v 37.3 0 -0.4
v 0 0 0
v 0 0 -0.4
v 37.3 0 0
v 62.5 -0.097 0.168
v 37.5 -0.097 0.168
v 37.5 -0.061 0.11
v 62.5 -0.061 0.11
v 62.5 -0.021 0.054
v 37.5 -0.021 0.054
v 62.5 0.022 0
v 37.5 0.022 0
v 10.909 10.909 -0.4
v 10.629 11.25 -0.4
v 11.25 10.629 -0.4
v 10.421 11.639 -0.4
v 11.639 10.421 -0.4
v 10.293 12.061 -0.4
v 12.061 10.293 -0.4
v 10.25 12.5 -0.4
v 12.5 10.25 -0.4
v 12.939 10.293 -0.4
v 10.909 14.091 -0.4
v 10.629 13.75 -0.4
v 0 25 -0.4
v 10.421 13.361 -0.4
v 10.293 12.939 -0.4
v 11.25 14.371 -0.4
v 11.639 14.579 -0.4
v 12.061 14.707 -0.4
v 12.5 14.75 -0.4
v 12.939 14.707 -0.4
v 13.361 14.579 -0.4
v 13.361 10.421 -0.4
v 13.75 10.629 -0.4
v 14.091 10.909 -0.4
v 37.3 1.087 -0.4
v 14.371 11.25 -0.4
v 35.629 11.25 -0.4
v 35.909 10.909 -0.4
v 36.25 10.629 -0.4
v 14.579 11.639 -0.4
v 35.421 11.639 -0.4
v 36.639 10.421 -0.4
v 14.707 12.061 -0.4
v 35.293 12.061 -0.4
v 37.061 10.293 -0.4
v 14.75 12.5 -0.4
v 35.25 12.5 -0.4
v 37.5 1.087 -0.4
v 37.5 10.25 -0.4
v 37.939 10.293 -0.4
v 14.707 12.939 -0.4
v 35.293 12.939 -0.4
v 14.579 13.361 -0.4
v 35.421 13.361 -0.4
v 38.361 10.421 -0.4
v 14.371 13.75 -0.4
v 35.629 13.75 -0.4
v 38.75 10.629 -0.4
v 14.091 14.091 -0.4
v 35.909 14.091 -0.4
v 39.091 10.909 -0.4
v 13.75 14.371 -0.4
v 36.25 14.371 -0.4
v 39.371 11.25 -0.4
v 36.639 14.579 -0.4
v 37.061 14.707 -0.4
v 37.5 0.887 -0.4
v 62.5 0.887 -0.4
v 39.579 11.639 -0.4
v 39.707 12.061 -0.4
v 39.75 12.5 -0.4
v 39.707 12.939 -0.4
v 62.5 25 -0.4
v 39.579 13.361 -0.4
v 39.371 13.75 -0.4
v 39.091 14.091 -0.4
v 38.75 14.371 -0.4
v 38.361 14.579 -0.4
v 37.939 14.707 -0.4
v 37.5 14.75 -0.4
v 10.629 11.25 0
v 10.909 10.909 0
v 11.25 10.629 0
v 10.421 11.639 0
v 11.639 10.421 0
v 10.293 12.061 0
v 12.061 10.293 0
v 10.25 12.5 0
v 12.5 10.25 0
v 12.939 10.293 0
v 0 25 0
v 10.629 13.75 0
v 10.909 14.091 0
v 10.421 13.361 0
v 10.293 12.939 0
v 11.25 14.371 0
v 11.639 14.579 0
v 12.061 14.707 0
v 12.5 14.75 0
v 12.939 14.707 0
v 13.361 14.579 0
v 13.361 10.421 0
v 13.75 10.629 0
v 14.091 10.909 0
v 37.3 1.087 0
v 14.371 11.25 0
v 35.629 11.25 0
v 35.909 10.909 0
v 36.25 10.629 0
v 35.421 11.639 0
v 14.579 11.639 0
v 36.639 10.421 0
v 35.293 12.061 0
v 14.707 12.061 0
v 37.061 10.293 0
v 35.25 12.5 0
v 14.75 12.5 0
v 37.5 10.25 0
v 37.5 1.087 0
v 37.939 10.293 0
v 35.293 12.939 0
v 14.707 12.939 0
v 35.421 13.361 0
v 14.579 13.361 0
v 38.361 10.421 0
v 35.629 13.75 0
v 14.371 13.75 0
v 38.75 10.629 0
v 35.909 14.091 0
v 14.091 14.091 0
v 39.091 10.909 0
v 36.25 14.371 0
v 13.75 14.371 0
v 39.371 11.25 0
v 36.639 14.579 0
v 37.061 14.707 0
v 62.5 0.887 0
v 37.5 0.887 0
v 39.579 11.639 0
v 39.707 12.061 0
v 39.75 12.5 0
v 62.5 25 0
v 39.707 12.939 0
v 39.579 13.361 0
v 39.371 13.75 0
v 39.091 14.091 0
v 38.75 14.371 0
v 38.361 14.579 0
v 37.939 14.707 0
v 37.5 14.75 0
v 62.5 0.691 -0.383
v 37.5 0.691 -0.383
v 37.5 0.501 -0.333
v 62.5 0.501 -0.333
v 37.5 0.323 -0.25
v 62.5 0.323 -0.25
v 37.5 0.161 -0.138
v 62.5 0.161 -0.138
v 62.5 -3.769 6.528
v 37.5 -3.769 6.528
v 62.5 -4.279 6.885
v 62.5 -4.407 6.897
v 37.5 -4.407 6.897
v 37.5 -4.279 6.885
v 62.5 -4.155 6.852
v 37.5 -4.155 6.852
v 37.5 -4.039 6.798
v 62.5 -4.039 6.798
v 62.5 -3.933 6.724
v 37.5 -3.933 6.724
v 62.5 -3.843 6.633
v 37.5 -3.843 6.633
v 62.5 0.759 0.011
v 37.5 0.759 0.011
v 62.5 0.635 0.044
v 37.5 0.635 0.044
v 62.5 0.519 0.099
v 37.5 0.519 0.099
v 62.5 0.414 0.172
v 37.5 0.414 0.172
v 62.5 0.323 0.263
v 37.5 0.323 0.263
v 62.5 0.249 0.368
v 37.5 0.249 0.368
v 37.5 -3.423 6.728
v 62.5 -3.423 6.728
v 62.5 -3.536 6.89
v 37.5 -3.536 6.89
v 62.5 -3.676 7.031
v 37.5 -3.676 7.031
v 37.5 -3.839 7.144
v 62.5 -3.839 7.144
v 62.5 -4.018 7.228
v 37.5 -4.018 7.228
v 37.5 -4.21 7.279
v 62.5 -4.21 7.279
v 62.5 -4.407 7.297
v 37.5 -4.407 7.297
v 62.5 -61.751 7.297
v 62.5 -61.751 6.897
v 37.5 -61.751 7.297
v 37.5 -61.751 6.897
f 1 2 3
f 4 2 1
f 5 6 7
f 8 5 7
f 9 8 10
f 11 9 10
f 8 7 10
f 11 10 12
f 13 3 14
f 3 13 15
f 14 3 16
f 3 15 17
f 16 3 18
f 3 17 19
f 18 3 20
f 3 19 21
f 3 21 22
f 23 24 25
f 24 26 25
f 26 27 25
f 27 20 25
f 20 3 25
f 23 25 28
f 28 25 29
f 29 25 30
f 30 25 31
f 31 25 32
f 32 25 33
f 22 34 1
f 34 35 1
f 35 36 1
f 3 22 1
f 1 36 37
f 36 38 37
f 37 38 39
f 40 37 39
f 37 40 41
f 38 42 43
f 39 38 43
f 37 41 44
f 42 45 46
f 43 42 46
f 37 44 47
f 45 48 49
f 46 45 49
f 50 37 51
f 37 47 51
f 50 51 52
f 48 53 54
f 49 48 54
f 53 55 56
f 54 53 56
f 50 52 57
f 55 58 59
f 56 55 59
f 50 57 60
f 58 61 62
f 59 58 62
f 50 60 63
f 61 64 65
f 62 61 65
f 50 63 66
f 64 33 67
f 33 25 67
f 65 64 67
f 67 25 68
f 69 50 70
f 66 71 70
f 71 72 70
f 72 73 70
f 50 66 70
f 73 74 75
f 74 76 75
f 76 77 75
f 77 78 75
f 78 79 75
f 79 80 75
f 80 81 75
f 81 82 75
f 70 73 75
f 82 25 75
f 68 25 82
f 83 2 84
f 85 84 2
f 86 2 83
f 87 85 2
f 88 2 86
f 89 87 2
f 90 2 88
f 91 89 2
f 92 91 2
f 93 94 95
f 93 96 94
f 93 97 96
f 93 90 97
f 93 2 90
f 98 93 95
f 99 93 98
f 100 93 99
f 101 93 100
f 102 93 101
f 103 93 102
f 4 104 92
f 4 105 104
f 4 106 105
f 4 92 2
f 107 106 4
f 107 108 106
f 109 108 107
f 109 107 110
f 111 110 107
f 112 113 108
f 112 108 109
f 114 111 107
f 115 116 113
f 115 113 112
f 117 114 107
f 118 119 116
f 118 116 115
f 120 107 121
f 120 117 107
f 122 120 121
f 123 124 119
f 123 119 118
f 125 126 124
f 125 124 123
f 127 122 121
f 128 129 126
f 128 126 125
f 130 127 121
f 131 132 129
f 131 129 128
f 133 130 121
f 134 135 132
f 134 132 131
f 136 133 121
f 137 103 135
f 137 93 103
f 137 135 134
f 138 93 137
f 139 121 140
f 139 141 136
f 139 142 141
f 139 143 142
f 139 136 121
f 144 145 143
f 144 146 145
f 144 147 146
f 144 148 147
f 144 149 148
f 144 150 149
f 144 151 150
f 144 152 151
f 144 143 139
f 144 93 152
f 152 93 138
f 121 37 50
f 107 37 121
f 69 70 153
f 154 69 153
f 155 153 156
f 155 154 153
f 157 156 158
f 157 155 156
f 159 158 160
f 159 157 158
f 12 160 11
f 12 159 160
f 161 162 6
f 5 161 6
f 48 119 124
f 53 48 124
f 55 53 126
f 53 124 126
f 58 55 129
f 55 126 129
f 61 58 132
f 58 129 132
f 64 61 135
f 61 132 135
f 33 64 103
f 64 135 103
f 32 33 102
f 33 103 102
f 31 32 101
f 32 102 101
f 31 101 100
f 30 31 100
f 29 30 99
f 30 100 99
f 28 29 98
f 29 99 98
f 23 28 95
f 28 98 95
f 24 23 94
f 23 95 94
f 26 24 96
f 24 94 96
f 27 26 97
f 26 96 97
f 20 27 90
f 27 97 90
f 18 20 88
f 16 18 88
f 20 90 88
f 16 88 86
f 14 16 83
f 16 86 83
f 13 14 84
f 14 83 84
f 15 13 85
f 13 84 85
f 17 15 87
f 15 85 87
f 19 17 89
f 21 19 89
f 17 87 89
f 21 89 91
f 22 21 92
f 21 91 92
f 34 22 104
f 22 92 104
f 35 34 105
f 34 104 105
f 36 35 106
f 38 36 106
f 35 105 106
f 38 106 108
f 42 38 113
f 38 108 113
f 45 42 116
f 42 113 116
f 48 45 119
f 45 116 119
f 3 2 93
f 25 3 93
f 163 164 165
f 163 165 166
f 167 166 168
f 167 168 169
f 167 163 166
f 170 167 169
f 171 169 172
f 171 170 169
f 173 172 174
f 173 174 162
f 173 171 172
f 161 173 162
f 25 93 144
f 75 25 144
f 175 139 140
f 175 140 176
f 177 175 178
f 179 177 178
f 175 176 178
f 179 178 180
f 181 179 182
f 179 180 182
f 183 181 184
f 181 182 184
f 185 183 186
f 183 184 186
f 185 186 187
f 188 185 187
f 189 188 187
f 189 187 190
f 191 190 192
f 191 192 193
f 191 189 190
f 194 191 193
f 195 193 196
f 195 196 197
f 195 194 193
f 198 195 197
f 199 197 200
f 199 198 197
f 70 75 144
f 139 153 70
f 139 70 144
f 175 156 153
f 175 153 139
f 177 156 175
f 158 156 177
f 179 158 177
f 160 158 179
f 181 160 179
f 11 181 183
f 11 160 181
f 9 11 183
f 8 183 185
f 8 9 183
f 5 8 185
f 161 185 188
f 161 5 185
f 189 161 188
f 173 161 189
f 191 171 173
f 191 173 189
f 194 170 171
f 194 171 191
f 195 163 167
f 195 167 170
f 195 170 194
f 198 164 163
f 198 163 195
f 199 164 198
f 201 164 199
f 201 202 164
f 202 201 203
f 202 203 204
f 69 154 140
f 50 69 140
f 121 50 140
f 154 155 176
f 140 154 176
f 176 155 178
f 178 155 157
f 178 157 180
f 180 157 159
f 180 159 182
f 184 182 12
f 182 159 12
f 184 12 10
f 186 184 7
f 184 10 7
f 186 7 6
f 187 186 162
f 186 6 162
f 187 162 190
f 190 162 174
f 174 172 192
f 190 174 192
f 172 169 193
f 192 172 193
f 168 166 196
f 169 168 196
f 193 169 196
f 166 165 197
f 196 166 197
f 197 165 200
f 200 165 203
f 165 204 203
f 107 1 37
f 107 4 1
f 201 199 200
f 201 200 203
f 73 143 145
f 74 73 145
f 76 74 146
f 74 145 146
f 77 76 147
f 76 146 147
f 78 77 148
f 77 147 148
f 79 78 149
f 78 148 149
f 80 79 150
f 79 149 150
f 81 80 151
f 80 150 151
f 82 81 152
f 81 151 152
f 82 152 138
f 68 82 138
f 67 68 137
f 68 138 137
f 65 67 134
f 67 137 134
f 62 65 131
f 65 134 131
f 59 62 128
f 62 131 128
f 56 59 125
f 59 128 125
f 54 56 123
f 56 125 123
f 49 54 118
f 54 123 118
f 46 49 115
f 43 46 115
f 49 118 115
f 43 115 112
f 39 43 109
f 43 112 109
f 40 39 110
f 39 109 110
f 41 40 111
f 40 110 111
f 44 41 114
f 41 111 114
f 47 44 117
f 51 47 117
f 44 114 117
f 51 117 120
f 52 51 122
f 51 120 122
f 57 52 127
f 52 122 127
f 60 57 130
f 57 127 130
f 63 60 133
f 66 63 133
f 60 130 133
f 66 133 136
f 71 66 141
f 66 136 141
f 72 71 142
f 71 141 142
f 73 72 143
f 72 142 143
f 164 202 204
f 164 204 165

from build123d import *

# Parameters (mm, degrees)
SKETCH1_W            = 62.5
SKETCH1_H            = 25
SKETCH1_R            = 2.25
BASE_FLANGE1_DEPTH   = 0.4
EDGE_FLANGE1_START   = 37.3
EDGE_FLANGE1_DEPTH   = 25.2
EDGE_FLANGE1_2_DEPTH = 0.2
EDGE_FLANGE1_START_2 = 37.5
EDGE_FLANGE1_3_DEPTH = 25
EDGE_FLANGE2_DEPTH   = 25


# Read off the part's stored shape, not the designer's step: Edge-Flange1
# Sheet-metal steps are written as plain solids
with BuildPart() as part:
    # Sketch1 → Base-Flange1 (new body)
    with BuildSketch(Plane.XY):
        with Locations((31.25, 12.5)):
            Rectangle(SKETCH1_W, SKETCH1_H)
        with Locations((12.5, 12.5)):
            Circle(SKETCH1_R, mode=Mode.SUBTRACT)
        with Locations((37.5, 12.5)):
            Circle(SKETCH1_R, mode=Mode.SUBTRACT)
    extrude(amount=-BASE_FLANGE1_DEPTH)

    # Edge-Flange1 outline → Edge-Flange1 (cut)
    with BuildSketch(Plane.YZ.offset(EDGE_FLANGE1_START)):
        with BuildLine():
            Line((0, -0.4), (0.887156424, -0.4))
            ThreePointArc((0.887156424, -0.4), (0.410375552, -0.295165264), (0.021546812, 0))
            Line((0.021546812, 0), (0, 0))
            Line((0, 0), (0, -0.4))
        make_face()
    extrude(amount=EDGE_FLANGE1_DEPTH, mode=Mode.SUBTRACT)

    # Edge-Flange1 2 outline → Edge-Flange1 2 (cut)
    with BuildSketch(Plane.YZ.offset(EDGE_FLANGE1_START)):
        with BuildLine():
            Line((1.087156424, -0.4), (1.087156424, 0))
            Line((1.087156424, 0), (0.021546812, 0))
            ThreePointArc((0.021546812, 0), (0.410375552, -0.295165264), (0.887156424, -0.4))
            Line((0.887156424, -0.4), (1.087156424, -0.4))
        make_face()
    extrude(amount=EDGE_FLANGE1_2_DEPTH, mode=Mode.SUBTRACT)

    # Edge-Flange1 3 outline → Edge-Flange1 3 (add)
    with BuildSketch(Plane.YZ.offset(EDGE_FLANGE1_START_2)):
        with BuildLine():
            Line((0.021546812, 0), (0.887156424, 0))
            ThreePointArc((0.887156424, 0), (0.518856424, 0.098685688), (0.249242111, 0.3683))
            Line((0.249242111, 0.3683), (-3.422649731, 6.72820323))
            Line((-3.422649731, 6.72820323), (-3.769059892, 6.52820323))
            Line((-3.769059892, 6.52820323), (-0.09716805, 0.1683))
            ThreePointArc((-0.09716805, 0.1683), (-0.041630555, 0.081455507), (0.021546812, 0))
        make_face()
    extrude(amount=EDGE_FLANGE1_3_DEPTH)

    # Edge-Flange2 section (across the edge) → Edge-Flange2 (add)
    with BuildSketch(Plane(origin=(62.5, -3.981697996, 6.89650323), x_dir=(0, 0, -1), z_dir=(-1, 0, 0))):
        with BuildLine():
            Line((-0.4, 0.425276208), (-0.4, 57.769059892))
            Line((-0.4, 57.769059892), (0, 57.769059892))
            Line((0, 57.769059892), (0, 0.425276208))
            ThreePointArc((0, 0.425276208), (0.098685688, 0.056976208), (0.3683, -0.212638104))
            Line((0.3683, -0.212638104), (0.1683, -0.559048266))
            ThreePointArc((0.1683, -0.559048266), (-0.247724474, -0.143023792), (-0.4, 0.425276208))
        make_face()
    extrude(amount=EDGE_FLANGE2_DEPTH)


solid = part.part
